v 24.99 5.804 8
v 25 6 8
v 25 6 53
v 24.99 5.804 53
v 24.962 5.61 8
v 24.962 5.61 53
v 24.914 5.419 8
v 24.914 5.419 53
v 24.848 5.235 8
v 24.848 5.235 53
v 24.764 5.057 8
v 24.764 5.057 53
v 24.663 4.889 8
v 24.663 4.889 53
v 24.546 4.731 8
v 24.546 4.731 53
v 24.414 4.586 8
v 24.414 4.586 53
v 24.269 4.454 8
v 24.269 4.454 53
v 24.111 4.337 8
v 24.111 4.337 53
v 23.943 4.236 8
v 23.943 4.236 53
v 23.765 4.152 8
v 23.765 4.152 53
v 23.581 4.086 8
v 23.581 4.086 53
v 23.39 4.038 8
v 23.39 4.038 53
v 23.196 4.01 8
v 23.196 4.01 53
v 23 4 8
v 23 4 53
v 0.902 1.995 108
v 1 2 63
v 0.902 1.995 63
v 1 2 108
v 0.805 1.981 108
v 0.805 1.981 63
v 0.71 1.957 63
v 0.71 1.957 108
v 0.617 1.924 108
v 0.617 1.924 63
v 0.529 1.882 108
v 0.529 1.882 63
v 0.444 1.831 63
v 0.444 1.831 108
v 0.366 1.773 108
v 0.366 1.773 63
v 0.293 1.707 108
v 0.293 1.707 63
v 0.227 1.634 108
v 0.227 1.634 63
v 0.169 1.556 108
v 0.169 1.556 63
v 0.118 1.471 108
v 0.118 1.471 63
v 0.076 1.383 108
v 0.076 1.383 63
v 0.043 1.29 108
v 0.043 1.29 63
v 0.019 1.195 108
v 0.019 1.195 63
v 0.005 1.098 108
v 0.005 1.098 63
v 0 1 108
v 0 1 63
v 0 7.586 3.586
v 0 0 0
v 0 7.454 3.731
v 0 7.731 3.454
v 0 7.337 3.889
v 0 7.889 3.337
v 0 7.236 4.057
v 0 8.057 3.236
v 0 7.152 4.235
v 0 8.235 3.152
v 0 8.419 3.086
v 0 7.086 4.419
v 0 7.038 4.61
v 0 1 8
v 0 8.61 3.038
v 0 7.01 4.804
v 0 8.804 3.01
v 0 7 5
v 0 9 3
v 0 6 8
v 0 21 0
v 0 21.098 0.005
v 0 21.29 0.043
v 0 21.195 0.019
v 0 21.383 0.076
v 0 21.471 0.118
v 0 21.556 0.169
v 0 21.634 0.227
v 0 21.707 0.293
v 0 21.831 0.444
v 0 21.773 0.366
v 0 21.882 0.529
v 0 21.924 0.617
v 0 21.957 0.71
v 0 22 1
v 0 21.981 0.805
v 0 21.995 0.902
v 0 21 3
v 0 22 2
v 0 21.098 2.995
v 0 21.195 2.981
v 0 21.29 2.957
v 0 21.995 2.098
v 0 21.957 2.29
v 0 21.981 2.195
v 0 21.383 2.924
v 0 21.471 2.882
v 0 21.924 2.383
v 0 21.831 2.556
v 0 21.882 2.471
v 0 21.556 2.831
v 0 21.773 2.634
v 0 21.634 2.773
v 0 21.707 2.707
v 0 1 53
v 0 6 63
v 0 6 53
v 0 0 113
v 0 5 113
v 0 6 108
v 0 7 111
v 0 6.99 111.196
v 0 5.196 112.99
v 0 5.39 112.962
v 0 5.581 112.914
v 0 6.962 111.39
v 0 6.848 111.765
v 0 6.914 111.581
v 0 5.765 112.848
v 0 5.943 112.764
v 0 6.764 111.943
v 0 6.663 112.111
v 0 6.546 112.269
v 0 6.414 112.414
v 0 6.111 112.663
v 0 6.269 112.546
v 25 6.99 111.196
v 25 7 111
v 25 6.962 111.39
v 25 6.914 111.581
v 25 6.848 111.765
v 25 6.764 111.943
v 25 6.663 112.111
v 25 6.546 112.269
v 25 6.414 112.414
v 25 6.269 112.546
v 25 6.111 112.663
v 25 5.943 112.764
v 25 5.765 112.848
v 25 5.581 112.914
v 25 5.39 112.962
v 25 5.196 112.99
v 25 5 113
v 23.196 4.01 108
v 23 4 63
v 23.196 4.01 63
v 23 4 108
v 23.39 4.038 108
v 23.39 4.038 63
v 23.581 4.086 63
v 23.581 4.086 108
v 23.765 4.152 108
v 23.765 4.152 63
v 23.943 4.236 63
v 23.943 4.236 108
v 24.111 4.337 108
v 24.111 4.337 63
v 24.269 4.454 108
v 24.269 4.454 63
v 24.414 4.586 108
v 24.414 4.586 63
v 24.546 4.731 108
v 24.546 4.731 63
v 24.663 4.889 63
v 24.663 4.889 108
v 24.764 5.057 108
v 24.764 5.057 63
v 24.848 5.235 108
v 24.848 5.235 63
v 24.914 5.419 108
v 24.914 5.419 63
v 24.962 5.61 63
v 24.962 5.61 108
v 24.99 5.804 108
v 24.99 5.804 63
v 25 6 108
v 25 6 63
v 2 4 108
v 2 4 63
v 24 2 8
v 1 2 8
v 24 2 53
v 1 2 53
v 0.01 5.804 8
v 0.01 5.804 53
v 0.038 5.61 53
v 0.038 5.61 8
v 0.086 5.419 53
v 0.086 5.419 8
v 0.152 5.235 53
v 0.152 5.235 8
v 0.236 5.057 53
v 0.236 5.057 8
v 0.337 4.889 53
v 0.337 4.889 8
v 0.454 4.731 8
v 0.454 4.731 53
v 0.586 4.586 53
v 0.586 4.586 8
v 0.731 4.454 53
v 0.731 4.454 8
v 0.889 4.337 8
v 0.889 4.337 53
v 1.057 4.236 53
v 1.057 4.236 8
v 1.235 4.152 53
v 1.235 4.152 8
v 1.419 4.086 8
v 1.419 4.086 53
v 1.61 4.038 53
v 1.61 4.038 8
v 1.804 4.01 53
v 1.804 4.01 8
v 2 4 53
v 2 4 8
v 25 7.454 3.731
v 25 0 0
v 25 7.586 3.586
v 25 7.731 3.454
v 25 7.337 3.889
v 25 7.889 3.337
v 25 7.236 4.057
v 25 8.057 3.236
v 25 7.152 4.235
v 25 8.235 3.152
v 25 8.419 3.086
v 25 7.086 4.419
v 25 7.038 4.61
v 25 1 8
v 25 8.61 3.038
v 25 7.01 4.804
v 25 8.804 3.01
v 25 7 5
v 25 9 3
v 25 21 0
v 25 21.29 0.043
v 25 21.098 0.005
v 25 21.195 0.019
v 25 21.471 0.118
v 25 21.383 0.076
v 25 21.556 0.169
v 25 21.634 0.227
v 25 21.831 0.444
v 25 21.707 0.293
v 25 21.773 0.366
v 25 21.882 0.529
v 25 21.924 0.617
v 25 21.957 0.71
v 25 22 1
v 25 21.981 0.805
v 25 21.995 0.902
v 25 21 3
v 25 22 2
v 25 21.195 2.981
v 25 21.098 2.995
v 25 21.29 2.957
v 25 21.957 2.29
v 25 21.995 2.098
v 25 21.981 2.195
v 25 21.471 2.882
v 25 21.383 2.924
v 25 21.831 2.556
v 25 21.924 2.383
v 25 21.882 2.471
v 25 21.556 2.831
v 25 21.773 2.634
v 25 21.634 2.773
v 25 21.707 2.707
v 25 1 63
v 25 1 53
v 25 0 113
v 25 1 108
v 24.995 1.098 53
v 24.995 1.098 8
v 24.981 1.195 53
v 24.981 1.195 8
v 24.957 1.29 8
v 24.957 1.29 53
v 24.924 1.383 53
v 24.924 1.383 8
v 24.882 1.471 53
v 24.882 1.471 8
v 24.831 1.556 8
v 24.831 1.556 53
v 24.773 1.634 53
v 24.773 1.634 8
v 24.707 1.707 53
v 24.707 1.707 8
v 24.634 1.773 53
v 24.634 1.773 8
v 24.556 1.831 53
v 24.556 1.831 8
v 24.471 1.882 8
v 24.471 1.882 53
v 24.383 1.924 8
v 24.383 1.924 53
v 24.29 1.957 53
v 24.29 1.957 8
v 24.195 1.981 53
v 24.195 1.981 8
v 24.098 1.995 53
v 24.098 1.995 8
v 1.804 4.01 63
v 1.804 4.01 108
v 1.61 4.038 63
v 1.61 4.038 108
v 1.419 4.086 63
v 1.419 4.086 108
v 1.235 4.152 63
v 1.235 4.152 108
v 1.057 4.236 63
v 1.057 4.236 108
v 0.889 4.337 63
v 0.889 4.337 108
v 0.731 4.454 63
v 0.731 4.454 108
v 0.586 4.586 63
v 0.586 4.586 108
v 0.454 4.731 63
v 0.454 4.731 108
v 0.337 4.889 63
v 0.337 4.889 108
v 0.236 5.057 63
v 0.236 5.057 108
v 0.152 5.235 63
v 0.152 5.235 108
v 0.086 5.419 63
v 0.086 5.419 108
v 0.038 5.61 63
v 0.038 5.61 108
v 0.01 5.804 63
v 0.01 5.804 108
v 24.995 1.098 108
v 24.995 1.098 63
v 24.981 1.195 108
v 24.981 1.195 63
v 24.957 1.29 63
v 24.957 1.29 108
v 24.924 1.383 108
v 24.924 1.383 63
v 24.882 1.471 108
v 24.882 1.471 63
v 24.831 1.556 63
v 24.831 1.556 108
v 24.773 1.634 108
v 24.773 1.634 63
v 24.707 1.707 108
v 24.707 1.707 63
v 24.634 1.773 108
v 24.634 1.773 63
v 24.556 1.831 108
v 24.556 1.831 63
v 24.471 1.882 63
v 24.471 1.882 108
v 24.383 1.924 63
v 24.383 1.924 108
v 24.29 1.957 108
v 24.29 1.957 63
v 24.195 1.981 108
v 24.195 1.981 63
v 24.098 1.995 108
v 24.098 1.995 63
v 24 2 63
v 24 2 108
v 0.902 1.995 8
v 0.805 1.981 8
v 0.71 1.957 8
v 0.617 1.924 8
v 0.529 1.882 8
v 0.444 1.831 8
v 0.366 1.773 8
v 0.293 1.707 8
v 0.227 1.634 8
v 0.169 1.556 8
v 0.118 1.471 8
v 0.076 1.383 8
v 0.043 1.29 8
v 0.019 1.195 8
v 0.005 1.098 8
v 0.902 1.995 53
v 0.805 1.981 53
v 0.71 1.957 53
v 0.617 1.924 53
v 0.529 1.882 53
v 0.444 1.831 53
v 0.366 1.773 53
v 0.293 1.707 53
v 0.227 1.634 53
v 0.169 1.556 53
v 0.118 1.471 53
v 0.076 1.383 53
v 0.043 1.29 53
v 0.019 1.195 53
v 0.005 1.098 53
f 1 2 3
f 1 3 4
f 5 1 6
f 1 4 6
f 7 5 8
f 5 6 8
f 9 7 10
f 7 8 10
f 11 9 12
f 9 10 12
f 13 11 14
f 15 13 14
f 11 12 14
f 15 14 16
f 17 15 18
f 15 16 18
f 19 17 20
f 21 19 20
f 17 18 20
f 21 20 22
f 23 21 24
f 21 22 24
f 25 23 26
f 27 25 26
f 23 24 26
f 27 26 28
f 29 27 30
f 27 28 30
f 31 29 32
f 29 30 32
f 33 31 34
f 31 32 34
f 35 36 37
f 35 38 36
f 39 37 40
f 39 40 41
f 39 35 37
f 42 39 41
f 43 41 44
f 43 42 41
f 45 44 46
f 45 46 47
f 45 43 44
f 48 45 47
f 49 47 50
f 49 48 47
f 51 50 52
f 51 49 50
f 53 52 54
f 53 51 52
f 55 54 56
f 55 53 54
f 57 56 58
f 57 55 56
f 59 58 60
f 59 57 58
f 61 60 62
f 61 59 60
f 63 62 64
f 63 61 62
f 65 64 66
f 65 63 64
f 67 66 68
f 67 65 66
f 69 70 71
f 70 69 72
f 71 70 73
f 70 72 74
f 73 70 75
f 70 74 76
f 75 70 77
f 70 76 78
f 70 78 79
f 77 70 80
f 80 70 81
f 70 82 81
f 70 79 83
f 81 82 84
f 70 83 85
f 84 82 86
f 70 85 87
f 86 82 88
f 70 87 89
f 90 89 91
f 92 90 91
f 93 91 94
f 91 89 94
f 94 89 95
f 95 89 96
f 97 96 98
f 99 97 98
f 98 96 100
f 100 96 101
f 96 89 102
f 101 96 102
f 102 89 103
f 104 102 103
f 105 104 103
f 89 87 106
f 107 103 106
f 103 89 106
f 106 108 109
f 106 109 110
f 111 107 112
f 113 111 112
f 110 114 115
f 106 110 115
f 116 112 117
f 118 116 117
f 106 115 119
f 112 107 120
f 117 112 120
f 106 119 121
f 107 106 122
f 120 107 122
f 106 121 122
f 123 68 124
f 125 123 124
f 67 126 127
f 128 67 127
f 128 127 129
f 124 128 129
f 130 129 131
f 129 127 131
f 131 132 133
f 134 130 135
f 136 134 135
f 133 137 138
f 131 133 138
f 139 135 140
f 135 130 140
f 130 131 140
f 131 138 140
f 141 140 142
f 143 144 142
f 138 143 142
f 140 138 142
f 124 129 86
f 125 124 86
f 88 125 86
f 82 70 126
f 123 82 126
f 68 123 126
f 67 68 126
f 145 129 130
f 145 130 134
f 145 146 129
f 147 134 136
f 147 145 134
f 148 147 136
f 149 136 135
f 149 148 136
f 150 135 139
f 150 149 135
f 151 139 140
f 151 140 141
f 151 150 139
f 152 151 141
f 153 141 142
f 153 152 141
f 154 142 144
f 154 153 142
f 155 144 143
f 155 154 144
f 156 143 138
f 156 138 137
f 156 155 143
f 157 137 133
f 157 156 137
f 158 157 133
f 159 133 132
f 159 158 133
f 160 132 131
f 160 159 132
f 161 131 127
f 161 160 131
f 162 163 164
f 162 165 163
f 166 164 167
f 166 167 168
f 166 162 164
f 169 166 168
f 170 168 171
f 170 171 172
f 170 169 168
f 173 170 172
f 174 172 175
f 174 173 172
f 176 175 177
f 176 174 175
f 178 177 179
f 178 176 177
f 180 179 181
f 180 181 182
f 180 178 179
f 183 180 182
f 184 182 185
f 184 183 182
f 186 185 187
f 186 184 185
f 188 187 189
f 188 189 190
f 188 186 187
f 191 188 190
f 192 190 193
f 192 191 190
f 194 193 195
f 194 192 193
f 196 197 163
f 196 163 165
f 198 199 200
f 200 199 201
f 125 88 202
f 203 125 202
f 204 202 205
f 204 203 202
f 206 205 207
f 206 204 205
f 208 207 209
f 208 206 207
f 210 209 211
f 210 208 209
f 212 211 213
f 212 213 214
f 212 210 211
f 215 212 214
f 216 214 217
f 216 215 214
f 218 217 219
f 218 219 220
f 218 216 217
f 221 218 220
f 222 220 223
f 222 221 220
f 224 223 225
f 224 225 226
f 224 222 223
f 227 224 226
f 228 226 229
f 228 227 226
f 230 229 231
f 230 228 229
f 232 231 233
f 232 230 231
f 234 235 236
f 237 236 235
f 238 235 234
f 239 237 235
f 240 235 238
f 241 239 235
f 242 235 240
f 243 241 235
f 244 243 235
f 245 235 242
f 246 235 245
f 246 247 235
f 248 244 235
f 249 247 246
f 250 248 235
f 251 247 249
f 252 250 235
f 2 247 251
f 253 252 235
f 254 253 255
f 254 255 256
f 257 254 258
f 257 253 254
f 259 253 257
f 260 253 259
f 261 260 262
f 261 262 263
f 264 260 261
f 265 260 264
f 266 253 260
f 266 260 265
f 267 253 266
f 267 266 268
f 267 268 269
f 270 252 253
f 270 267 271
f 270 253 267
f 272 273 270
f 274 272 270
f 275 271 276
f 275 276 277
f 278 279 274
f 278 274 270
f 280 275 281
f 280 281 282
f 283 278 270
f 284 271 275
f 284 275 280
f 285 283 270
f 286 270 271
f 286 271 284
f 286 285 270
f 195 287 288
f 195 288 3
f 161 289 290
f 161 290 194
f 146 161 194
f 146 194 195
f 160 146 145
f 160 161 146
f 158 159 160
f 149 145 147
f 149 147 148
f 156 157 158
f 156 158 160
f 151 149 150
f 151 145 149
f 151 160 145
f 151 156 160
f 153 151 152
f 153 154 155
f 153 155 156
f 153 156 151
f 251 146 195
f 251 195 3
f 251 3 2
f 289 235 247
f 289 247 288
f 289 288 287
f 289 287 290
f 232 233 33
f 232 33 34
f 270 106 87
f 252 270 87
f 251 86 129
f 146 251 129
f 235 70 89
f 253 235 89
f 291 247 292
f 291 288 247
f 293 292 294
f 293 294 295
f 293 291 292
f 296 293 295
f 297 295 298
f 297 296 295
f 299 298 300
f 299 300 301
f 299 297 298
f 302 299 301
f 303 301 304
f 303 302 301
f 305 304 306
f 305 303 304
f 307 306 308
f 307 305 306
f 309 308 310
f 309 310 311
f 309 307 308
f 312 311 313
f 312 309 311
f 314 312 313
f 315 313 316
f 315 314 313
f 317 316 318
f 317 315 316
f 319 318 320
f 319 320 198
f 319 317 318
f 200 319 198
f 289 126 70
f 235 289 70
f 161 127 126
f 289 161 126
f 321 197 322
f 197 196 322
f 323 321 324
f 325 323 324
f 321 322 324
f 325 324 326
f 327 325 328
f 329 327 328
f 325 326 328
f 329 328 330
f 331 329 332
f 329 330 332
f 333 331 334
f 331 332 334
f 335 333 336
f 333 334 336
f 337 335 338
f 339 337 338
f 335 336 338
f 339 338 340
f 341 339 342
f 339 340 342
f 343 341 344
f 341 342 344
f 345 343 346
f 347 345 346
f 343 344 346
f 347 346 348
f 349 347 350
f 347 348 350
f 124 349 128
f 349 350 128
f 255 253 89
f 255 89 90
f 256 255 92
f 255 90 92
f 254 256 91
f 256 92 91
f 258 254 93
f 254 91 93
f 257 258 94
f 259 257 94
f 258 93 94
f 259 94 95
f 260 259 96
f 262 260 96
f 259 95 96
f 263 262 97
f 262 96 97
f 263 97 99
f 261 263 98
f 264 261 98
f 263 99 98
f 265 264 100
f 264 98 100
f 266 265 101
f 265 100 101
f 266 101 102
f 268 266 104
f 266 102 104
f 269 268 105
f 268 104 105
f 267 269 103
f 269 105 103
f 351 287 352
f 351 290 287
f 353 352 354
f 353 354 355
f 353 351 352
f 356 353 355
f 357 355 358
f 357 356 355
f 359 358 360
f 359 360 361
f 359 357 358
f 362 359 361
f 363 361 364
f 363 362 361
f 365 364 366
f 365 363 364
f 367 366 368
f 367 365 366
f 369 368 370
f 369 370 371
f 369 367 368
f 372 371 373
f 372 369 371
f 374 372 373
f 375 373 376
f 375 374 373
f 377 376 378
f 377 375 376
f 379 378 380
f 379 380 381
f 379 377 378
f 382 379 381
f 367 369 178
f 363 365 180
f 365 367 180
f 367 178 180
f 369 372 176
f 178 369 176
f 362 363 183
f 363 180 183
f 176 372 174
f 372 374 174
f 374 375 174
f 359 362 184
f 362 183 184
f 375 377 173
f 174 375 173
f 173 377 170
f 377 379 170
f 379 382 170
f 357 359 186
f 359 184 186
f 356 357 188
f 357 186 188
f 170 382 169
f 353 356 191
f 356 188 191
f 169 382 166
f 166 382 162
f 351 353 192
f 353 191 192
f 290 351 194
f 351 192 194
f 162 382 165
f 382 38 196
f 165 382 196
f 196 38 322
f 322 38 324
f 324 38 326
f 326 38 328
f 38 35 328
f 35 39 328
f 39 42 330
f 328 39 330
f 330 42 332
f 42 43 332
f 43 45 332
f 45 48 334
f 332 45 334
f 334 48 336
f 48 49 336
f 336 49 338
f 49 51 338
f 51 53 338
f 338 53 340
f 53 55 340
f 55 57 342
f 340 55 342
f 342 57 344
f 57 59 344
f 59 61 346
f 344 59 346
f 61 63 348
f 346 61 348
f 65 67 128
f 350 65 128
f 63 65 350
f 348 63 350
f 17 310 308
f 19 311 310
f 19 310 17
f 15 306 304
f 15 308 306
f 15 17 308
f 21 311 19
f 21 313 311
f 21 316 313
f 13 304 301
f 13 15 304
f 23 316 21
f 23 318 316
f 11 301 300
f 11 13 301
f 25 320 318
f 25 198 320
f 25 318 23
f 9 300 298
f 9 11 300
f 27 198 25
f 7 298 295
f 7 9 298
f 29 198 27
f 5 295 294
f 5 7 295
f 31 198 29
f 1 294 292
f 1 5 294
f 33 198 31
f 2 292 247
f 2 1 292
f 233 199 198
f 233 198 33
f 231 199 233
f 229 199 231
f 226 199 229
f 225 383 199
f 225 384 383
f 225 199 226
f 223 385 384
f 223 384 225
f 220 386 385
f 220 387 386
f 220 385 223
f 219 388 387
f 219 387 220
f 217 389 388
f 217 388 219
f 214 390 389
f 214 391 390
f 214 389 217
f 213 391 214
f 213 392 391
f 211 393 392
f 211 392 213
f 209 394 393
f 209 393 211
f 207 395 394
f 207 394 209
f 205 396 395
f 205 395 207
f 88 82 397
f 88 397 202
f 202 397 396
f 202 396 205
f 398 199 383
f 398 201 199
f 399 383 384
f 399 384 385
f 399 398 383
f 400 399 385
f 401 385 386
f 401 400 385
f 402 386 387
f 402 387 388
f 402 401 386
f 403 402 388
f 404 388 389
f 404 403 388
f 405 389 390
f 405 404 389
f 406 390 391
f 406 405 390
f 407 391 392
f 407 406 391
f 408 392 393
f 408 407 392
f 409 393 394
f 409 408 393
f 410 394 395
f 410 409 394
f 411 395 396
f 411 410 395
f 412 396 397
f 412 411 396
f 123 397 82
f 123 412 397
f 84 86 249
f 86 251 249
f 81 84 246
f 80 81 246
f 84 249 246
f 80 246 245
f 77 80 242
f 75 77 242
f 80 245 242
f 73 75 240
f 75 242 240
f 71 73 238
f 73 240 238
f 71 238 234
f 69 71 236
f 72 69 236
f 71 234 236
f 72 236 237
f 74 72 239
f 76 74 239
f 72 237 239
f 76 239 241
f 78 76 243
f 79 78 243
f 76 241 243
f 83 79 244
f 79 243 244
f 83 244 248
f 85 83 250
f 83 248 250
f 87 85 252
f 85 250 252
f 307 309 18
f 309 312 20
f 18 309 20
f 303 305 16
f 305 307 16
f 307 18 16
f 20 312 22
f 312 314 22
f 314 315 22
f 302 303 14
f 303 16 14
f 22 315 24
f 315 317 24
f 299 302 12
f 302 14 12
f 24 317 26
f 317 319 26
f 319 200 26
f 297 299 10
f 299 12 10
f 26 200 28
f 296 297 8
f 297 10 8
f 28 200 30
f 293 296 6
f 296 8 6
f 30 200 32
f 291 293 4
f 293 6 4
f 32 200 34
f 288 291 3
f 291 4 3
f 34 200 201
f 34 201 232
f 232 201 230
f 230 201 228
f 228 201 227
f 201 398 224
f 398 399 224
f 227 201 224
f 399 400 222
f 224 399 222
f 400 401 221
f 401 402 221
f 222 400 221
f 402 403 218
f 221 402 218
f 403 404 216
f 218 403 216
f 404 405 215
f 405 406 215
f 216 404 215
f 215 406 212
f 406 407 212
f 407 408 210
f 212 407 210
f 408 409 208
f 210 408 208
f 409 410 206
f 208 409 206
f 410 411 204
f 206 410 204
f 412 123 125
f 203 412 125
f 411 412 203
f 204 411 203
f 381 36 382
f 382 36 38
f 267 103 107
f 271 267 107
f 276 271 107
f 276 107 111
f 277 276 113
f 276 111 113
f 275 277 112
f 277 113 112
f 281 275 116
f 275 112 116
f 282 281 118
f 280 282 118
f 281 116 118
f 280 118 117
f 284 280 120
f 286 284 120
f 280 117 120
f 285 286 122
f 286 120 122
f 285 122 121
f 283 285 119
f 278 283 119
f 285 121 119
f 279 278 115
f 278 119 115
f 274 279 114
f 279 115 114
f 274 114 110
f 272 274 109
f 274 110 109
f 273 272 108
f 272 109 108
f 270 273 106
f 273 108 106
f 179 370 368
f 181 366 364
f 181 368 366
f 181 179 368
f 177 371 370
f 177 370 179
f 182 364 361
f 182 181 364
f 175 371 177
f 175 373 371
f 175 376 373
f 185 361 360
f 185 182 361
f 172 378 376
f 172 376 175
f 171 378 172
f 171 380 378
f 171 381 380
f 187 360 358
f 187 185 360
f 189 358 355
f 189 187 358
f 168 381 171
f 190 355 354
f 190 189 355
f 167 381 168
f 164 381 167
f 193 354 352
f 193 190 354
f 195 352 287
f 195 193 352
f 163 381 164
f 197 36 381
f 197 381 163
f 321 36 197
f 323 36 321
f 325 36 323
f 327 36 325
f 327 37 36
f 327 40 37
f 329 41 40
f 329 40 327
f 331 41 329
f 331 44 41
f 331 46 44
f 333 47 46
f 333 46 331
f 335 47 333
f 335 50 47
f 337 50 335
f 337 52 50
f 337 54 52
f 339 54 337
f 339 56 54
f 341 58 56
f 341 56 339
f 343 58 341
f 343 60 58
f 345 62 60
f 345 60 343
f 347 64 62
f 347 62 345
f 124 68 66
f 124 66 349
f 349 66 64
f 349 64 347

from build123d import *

# Parameters (mm, degrees)
F0_W     = 2
F0_H     = 45
F1_DEPTH = 25
F2_R     = 2
F4_R     = 1


# Not quite as in the source:
# - two fillets or chamfers of one size are made in one step


with BuildPart() as f1:
    # F0 (on Right) → F1 (new body)
    with BuildSketch(Plane.YZ):
        with BuildLine():
            Line((7, 113), (0, 113))
            Line((0, 113), (0, 0))
            Line((0, 0), (21, 0))
            ThreePointArc((21, 0), (21.7071067812, 0.2928932188), (22, 1))
            Line((22, 1), (22, 2))
            ThreePointArc((22, 2), (21.7071067812, 2.7071067812), (21, 3))
            Line((21, 3), (7, 3))
            Line((7, 3), (7, 113))
        make_face()
        with Locations((3, 30.5)):
            Rectangle(F0_W, F0_H, mode=Mode.SUBTRACT)
        with Locations((3, 85.5)):
            Rectangle(F0_W, F0_H, mode=Mode.SUBTRACT)
    extrude(amount=F1_DEPTH)

    # F2 (call 1 of 6: OpenCascade refuses the feature's edges together)
    f2_edges = [f1.edges().sort_by_distance(p)[0] for p in [
        (12.5, 7, 3),
    ]]
    fillet(f2_edges, radius=F2_R)

    # F2#2 (call 2 of 6)
    f2_2_edges = [f1.edges().sort_by_distance(p)[0] for p in [
        (12.5, 7, 113),
    ]]
    fillet(f2_2_edges, radius=F2_R)

    # F2#3 (call 3 of 6)
    f2_3_edges = [f1.edges().sort_by_distance(p)[0] for p in [
        (0, 4, 30.5),
    ]]
    fillet(f2_3_edges, radius=F2_R)

    # F2#4 (call 4 of 6)
    f2_4_edges = [f1.edges().sort_by_distance(p)[0] for p in [
        (25, 4, 30.5),
    ]]
    fillet(f2_4_edges, radius=F2_R)

    # F2#5 (call 5 of 6)
    f2_5_edges = [f1.edges().sort_by_distance(p)[0] for p in [
        (0, 4, 85.5),
    ]]
    fillet(f2_5_edges, radius=F2_R)

    # F2#6 (call 6 of 6)
    f2_6_edges = [f1.edges().sort_by_distance(p)[0] for p in [
        (25, 4, 85.5),
    ]]
    fillet(f2_6_edges, radius=F2_R)

    # F4
    f4_edges = [f1.edges().sort_by_distance(p)[0] for p in [
        (25, 2, 30.5),
        (25, 2, 85.5),
        (0, 2, 85.5),
        (0, 2, 30.5),
    ]]
    fillet(f4_edges, radius=F4_R)


solid = f1.part
